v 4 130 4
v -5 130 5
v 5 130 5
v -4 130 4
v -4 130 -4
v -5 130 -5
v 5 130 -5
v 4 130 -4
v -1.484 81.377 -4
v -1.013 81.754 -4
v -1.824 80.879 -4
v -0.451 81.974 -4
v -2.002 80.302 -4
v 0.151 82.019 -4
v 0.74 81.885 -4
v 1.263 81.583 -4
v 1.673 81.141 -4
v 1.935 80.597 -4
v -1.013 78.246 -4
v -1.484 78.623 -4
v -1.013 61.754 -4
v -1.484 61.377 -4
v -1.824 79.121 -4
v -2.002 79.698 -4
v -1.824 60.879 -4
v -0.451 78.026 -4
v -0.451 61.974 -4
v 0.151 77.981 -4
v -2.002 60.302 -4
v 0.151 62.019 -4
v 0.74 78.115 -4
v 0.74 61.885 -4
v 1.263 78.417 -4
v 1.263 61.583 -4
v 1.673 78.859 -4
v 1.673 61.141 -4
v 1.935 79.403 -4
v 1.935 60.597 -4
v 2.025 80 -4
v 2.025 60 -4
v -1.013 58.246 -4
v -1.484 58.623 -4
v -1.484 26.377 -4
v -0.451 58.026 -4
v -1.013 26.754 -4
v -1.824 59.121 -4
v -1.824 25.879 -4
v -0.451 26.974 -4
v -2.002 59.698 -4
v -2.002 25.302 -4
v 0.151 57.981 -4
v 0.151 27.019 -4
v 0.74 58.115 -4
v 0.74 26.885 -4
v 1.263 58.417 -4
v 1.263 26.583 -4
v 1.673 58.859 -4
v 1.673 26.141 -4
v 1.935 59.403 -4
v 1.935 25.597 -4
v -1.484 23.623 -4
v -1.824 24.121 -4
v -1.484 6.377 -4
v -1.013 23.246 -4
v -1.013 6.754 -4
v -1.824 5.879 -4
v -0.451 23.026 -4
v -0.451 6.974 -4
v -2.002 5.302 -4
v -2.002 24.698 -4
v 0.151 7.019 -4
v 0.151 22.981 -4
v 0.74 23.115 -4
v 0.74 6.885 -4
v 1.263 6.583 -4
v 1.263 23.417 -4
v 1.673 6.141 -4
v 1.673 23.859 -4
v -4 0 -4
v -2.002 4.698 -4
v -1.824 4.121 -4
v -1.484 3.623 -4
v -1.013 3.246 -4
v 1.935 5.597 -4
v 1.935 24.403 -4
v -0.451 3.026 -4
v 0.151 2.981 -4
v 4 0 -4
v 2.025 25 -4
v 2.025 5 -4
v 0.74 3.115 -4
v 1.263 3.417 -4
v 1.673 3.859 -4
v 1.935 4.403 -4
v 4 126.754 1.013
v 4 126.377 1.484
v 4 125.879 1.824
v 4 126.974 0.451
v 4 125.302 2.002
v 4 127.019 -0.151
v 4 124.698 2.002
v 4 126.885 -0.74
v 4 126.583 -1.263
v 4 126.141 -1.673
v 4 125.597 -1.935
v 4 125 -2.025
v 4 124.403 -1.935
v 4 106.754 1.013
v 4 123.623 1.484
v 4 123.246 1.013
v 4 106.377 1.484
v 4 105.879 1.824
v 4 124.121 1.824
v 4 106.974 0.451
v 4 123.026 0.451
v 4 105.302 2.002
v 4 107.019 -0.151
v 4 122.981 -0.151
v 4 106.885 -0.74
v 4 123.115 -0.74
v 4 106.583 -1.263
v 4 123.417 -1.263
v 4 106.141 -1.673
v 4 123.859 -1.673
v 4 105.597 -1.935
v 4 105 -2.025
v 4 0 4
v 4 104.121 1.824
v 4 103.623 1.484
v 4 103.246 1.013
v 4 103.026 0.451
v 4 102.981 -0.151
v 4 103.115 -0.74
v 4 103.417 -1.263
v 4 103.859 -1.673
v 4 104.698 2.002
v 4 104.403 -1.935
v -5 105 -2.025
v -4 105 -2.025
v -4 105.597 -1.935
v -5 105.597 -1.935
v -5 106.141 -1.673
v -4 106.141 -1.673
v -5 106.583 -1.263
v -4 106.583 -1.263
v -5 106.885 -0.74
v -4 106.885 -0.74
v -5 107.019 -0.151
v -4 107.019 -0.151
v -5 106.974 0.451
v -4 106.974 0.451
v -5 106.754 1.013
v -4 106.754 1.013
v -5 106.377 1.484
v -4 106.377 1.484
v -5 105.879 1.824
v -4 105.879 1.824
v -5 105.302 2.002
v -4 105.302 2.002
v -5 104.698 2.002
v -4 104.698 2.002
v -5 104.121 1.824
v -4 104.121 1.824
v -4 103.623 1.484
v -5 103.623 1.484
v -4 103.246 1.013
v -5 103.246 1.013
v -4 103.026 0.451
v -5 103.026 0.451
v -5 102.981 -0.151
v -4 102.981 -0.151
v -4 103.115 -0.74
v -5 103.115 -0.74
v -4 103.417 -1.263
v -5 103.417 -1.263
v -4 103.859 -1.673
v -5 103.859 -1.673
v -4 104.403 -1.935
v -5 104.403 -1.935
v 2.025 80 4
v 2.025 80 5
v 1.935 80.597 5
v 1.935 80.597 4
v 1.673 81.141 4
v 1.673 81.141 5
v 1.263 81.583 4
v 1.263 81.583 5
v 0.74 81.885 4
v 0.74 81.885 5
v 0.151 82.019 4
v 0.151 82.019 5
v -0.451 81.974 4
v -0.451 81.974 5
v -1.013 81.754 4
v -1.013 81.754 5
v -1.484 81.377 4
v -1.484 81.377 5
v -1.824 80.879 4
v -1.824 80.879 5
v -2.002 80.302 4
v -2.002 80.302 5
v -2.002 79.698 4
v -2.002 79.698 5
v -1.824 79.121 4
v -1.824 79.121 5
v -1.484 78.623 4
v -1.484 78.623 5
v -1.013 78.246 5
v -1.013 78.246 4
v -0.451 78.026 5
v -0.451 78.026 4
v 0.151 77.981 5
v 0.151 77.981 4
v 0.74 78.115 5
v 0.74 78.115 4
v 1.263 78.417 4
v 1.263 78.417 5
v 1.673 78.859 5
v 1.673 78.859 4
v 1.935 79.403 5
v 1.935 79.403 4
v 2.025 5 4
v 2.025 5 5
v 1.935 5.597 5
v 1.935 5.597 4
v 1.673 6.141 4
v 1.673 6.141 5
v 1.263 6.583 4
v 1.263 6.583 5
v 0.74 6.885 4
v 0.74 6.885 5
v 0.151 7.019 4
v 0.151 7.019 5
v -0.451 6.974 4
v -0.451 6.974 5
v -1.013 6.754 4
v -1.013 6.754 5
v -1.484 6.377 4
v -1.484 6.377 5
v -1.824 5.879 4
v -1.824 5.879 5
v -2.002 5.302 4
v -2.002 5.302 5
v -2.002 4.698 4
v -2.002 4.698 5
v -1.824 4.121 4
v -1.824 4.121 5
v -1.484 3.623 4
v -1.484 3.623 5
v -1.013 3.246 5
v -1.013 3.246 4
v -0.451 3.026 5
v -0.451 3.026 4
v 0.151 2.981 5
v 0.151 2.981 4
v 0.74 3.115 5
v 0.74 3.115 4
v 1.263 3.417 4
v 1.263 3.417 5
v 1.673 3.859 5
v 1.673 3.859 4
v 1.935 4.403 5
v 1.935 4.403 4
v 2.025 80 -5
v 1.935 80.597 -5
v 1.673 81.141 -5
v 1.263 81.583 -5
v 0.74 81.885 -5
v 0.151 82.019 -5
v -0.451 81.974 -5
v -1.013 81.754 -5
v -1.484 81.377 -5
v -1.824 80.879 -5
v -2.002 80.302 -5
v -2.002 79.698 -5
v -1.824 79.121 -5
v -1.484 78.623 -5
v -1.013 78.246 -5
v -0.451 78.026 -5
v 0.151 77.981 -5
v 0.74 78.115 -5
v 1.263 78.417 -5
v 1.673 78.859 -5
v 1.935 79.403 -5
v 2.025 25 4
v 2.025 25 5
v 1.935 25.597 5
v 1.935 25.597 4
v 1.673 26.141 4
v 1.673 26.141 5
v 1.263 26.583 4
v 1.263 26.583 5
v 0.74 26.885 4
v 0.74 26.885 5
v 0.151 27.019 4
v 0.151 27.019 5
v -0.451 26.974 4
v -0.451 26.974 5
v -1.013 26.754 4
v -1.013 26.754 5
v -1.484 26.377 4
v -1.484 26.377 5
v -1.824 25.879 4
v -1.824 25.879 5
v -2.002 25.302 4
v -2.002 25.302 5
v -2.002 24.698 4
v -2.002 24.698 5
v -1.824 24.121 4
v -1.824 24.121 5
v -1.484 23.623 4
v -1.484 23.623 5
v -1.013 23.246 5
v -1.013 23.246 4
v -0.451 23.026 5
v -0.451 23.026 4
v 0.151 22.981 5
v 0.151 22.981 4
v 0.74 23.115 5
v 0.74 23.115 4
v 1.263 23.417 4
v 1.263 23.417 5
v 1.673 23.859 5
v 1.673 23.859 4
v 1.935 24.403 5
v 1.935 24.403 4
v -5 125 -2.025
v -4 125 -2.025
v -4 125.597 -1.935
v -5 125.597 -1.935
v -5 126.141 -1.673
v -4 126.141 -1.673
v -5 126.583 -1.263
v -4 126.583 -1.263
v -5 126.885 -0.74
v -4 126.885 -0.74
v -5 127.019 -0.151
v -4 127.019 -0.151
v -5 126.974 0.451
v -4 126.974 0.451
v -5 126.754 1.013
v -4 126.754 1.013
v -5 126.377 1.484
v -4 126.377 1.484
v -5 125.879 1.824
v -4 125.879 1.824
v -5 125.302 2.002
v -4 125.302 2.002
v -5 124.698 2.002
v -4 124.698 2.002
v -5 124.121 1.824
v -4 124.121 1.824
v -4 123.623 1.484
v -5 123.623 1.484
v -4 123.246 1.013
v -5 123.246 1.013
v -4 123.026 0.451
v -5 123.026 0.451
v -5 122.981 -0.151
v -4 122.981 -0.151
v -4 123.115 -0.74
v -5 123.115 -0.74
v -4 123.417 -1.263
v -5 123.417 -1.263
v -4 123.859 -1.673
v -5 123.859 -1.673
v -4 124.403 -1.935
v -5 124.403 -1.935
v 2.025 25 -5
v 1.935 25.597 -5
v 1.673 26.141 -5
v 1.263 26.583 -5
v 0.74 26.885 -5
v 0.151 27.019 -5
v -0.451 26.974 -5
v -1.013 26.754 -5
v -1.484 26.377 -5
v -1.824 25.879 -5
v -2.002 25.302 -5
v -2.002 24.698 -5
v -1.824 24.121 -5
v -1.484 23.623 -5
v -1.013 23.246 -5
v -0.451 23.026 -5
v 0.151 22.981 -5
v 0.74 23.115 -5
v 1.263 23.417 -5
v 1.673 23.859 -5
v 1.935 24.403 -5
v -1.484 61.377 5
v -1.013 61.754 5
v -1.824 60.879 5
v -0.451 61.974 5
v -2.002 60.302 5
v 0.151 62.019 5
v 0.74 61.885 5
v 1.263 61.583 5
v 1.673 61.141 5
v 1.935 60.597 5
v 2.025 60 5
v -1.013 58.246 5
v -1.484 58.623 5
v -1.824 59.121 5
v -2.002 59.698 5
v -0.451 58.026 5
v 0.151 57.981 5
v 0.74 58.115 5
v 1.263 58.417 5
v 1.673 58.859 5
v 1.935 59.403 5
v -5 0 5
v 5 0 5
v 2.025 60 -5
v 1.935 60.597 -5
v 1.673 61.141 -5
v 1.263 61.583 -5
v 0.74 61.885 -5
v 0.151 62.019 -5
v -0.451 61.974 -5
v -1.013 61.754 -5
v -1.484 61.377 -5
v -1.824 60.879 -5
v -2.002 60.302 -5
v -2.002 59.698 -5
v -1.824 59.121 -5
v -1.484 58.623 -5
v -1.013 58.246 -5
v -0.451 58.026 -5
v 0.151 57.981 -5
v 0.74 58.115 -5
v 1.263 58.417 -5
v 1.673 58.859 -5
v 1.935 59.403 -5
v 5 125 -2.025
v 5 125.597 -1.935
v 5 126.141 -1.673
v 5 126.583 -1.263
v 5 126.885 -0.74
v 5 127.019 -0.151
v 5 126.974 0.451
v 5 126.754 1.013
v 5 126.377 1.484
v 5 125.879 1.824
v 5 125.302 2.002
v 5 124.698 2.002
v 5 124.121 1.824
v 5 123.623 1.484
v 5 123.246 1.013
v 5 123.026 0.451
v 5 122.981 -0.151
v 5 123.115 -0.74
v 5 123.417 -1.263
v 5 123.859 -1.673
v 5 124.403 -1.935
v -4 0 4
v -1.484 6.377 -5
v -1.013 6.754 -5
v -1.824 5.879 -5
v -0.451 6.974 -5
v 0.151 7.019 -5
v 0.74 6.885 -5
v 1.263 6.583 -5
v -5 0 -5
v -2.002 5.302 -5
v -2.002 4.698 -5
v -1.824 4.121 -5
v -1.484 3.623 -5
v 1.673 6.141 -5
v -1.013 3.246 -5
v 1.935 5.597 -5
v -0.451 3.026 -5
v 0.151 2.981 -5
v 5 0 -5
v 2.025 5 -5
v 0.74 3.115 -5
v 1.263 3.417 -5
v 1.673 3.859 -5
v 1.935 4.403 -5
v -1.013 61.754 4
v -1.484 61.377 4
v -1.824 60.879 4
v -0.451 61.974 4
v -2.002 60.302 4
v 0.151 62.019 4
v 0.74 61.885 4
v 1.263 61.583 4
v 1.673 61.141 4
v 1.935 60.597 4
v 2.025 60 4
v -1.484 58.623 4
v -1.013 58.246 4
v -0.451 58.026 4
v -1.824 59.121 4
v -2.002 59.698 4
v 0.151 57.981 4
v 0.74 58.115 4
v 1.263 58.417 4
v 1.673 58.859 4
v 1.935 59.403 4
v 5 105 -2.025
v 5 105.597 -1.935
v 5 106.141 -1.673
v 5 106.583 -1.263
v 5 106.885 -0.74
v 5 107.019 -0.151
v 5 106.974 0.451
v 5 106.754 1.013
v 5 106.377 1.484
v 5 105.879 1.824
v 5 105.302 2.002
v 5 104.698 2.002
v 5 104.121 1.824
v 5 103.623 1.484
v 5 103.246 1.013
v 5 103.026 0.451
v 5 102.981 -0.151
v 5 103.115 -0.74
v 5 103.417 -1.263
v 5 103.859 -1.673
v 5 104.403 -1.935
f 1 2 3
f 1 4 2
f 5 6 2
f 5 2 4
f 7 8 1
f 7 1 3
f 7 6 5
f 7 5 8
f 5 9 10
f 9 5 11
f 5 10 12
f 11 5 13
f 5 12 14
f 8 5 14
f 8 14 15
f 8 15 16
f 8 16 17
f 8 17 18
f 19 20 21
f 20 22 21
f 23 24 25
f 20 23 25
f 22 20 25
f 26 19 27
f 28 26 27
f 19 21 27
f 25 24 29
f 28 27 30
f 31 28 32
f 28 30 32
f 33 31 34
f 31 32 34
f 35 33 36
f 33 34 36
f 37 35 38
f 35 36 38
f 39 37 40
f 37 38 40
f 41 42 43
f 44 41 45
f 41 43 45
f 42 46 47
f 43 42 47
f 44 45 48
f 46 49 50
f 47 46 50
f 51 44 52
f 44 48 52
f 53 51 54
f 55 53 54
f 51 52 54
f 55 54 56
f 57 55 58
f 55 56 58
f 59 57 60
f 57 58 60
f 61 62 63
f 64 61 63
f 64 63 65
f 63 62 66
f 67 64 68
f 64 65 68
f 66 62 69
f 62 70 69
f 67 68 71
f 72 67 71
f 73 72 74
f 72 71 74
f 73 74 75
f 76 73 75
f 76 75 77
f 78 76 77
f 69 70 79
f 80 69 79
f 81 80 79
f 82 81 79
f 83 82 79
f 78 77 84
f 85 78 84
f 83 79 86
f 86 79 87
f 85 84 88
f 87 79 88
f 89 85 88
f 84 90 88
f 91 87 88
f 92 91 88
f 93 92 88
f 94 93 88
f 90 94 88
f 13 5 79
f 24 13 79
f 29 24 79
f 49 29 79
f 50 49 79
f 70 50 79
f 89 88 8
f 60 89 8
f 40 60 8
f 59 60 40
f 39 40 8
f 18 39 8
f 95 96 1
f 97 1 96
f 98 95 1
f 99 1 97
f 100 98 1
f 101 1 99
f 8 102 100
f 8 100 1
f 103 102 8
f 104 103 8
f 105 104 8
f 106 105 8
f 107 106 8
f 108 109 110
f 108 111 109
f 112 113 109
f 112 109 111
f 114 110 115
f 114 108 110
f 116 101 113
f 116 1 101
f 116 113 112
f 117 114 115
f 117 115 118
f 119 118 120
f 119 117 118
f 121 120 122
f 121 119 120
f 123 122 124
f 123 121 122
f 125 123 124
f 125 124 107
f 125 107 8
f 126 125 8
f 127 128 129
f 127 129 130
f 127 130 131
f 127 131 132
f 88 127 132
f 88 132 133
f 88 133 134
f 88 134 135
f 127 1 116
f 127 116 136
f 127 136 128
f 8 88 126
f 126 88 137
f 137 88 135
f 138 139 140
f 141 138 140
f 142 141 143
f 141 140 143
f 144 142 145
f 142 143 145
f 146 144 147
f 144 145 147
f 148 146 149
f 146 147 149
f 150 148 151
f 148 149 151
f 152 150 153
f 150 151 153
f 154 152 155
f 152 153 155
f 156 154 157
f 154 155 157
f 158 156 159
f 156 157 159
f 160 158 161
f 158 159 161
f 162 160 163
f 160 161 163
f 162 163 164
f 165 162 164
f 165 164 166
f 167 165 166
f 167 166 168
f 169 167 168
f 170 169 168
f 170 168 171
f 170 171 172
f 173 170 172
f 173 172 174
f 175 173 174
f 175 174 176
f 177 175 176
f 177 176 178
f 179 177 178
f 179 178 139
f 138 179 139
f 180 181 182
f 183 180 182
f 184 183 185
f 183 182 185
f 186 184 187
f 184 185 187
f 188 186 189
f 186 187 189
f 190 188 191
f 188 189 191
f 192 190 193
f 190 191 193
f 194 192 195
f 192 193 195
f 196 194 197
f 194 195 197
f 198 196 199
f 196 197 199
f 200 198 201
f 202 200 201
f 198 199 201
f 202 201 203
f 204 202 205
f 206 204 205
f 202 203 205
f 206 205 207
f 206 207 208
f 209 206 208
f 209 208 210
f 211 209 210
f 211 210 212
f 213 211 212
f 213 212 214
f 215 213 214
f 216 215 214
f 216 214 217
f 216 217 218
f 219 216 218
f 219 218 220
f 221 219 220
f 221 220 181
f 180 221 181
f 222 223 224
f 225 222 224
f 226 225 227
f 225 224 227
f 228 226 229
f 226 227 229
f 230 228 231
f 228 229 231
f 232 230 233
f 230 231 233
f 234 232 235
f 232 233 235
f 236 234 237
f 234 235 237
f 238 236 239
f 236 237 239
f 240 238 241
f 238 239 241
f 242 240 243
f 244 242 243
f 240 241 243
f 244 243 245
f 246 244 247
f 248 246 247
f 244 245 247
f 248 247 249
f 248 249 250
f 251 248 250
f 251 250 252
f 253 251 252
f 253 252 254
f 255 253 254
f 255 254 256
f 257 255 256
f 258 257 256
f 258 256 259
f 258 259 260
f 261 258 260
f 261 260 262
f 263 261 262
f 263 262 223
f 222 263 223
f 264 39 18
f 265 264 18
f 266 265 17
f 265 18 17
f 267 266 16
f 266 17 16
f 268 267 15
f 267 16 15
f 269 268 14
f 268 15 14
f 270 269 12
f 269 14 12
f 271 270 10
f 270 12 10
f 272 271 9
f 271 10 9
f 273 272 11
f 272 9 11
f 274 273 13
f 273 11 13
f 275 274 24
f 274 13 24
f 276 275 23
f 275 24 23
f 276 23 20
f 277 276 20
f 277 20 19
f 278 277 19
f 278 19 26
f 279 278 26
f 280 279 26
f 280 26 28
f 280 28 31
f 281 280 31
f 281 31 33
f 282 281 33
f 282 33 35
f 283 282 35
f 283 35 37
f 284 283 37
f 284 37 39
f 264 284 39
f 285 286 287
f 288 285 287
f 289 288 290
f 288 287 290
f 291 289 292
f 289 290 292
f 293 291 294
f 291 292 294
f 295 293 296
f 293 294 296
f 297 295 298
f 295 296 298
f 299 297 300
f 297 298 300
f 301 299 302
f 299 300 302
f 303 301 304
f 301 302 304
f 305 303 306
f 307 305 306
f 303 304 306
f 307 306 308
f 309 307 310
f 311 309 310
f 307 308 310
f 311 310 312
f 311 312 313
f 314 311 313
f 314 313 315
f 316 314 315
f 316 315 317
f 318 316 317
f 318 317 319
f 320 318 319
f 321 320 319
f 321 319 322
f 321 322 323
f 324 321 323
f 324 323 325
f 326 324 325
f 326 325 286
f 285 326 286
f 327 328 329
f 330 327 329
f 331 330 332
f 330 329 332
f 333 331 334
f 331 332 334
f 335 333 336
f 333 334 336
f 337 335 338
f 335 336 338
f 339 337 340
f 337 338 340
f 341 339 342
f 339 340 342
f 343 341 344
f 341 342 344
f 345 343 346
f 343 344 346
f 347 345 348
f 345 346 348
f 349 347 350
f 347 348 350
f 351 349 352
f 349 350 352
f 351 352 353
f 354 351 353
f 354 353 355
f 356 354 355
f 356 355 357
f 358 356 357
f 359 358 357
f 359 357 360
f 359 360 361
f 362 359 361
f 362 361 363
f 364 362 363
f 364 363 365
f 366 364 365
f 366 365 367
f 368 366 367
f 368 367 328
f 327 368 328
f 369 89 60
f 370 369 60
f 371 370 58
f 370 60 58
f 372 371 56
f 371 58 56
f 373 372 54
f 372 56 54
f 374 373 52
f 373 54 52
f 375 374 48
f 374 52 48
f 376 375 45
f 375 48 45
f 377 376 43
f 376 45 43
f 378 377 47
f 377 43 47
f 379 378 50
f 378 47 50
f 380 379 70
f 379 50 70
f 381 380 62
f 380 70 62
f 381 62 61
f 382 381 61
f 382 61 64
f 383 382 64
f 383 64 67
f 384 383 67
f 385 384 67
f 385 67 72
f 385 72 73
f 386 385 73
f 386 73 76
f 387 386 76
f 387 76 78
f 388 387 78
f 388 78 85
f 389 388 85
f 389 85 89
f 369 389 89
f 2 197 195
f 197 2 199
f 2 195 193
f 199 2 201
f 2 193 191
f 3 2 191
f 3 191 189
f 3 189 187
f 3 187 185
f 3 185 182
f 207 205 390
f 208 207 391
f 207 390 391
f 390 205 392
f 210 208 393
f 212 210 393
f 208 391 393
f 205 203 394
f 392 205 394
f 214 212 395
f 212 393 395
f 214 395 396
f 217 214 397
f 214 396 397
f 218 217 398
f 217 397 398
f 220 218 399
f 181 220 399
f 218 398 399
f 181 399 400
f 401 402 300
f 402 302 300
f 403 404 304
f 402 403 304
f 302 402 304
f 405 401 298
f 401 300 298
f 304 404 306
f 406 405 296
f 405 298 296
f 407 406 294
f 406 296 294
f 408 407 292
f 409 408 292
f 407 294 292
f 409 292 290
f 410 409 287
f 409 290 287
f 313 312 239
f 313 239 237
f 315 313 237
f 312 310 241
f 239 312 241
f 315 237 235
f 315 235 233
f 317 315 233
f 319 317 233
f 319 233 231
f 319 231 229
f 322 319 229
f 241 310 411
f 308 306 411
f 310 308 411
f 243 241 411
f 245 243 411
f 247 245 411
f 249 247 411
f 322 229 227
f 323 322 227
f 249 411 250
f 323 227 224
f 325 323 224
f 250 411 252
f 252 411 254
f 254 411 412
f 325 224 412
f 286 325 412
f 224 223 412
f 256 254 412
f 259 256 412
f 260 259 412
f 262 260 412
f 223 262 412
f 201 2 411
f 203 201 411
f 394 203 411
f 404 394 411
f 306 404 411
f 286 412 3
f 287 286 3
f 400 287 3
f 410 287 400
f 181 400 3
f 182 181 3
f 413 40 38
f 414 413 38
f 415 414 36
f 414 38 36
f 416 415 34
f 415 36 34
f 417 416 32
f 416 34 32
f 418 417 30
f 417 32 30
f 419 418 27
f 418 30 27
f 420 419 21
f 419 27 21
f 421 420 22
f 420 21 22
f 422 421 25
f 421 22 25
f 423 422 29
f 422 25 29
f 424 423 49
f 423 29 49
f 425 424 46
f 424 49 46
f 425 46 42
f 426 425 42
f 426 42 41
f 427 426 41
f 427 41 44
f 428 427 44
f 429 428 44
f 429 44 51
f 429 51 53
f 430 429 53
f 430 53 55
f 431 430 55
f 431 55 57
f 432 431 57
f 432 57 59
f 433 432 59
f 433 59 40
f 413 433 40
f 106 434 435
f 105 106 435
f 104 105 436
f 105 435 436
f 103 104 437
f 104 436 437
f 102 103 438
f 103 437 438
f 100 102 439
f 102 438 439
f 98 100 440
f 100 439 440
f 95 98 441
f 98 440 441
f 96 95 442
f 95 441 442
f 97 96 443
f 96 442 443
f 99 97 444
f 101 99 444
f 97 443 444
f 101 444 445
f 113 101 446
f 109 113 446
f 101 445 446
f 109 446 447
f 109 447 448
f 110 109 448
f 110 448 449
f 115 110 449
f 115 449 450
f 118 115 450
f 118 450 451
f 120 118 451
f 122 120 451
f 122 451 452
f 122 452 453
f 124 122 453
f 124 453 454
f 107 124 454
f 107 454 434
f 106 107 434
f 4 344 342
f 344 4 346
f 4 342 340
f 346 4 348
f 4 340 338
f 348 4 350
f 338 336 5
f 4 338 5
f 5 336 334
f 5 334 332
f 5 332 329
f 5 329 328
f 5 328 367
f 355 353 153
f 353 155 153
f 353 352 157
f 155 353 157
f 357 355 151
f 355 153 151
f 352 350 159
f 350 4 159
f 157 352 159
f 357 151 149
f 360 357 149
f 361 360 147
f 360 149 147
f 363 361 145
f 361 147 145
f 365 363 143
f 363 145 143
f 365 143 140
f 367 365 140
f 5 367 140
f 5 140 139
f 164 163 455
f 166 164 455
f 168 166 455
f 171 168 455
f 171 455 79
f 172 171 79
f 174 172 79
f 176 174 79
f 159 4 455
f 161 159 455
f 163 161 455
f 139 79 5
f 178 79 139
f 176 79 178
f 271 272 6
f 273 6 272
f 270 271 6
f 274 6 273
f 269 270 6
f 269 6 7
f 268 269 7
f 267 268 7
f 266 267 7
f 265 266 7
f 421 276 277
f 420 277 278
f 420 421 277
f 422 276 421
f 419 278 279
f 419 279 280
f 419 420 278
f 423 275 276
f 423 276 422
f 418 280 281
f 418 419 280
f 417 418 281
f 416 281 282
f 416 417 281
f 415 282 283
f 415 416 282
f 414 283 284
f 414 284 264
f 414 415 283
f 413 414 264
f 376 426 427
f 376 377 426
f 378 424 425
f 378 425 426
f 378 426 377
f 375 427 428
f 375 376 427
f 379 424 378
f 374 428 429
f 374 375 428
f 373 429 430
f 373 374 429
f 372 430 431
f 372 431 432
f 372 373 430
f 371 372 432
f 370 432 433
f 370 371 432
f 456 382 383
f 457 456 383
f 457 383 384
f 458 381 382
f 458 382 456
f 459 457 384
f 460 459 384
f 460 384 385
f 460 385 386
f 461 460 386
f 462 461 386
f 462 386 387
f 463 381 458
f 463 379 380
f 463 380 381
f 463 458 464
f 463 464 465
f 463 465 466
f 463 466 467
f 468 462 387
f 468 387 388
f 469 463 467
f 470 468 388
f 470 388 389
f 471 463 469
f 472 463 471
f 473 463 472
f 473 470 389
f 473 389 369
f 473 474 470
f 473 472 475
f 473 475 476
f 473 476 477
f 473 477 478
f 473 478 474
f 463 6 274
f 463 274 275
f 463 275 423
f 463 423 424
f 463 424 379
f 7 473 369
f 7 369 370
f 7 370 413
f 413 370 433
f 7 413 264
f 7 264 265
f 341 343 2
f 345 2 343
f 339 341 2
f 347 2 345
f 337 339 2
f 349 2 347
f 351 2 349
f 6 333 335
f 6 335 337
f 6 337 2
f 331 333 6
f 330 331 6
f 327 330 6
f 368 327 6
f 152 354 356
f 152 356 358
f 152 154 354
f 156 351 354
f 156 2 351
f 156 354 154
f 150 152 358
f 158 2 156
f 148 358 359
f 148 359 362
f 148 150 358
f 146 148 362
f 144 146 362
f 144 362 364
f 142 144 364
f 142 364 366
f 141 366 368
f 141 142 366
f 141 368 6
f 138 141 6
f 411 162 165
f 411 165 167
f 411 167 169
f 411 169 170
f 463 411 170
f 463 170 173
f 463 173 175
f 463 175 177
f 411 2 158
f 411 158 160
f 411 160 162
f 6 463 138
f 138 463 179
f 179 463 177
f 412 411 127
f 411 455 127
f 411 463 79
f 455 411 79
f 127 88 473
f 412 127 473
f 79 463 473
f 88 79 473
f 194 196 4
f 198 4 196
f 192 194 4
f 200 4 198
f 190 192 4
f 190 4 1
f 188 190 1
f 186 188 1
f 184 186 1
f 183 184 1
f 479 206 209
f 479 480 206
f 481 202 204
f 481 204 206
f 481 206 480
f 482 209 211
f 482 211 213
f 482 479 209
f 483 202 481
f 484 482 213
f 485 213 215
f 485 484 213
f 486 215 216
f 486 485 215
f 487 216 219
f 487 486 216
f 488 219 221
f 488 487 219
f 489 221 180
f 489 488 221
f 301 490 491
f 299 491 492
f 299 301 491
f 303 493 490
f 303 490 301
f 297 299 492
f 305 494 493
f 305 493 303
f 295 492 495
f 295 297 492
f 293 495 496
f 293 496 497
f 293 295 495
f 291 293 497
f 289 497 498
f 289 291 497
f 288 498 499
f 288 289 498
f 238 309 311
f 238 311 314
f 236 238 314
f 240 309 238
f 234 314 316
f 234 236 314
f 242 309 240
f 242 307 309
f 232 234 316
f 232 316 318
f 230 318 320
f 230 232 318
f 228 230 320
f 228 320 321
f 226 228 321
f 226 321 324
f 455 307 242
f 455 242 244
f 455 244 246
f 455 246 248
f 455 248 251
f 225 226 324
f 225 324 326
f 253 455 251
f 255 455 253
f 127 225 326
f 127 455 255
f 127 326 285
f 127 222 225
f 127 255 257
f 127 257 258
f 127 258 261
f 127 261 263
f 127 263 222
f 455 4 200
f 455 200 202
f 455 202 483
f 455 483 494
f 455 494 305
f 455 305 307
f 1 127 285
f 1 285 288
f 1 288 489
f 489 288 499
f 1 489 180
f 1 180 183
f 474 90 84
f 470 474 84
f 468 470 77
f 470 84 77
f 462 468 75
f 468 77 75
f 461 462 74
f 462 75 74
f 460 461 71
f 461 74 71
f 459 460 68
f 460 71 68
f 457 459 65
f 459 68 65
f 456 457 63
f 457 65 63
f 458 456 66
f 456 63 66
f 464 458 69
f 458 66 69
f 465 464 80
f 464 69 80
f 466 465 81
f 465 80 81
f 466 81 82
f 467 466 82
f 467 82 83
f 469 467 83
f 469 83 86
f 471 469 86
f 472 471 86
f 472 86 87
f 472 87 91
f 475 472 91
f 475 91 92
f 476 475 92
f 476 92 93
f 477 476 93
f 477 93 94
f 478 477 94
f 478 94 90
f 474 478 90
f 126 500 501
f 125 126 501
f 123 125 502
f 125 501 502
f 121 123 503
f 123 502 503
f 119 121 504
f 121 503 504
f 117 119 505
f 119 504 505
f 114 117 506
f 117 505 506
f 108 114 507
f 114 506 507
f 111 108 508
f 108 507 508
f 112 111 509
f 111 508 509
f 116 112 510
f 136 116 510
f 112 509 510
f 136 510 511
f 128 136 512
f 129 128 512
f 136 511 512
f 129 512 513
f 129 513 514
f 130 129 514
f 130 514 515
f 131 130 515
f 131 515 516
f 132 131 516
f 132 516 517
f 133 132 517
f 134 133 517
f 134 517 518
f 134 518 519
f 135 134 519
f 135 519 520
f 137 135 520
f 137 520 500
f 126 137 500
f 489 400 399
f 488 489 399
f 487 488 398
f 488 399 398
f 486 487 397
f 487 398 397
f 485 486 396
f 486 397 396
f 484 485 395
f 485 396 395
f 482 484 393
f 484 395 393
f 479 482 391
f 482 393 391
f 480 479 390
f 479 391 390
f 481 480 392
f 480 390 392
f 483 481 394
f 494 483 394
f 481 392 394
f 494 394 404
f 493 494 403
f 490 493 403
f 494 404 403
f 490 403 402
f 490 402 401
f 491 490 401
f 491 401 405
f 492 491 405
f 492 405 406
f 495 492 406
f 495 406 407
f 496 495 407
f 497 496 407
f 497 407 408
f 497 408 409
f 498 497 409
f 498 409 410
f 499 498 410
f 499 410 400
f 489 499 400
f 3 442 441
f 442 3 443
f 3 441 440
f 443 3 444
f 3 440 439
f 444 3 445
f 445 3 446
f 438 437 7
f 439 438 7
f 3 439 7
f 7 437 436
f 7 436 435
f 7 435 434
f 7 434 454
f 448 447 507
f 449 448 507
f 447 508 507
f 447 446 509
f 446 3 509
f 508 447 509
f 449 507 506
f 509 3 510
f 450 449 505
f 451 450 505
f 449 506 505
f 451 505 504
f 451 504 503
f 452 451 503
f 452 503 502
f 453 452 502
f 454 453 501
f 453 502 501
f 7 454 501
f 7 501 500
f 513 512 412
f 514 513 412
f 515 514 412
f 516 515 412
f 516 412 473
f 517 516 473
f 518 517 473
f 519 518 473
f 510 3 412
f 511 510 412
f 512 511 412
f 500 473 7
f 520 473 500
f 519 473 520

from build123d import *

# Parameters (mm, degrees)
SKETCH1_W           = 10
SKETCH1_H           = 10
SKETCH1_W_2         = 8
SKETCH1_H_2         = 8
BOSS_EXTRUDE1_DEPTH = 130
SKETCH2_R           = 2.025
CUT_EXTRUDE1_DEPTH  = 131.479883507
SKETCH3_R           = 2.025
CUT_EXTRUDE2_DEPTH  = 131.479883507
SKETCH4_R           = 2.025
CUT_EXTRUDE3_DEPTH  = 131.479883507


with BuildPart() as part:
    # Sketch1 → Boss-Extrude1 (new body)
    with BuildSketch(Plane(origin=(0, 0, 0), x_dir=(1, 0, 0), z_dir=(0, 1, 0))):
        Rectangle(SKETCH1_W, SKETCH1_H)
        Rectangle(SKETCH1_W_2, SKETCH1_H_2, mode=Mode.SUBTRACT)
    extrude(amount=BOSS_EXTRUDE1_DEPTH)

    # Sketch2 → Cut-Extrude1 (cut, through all)
    with BuildSketch(Plane.XY.offset(5)):
        with Locations((0, 5)):
            Circle(SKETCH2_R)
        with Locations((0, 25)):
            Circle(SKETCH2_R)
    extrude(amount=-CUT_EXTRUDE1_DEPTH, mode=Mode.SUBTRACT)

    # Sketch3 → Cut-Extrude2 (cut, through all)
    with BuildSketch(Plane(origin=(5, 0, 0), x_dir=(0, 0, -1), z_dir=(1, 0, 0))):
        with Locations((0, 125)):
            Circle(SKETCH3_R)
        with Locations((0, 105)):
            Circle(SKETCH3_R)
    extrude(amount=-CUT_EXTRUDE2_DEPTH, mode=Mode.SUBTRACT)

    # Sketch4 → Cut-Extrude3 (cut, through all)
    with BuildSketch(Plane.XY.offset(5)):
        with Locations((0, 60)):
            Circle(SKETCH4_R)
        with Locations((0, 80)):
            Circle(SKETCH4_R)
    extrude(amount=-CUT_EXTRUDE3_DEPTH, mode=Mode.SUBTRACT)


solid = part.part
